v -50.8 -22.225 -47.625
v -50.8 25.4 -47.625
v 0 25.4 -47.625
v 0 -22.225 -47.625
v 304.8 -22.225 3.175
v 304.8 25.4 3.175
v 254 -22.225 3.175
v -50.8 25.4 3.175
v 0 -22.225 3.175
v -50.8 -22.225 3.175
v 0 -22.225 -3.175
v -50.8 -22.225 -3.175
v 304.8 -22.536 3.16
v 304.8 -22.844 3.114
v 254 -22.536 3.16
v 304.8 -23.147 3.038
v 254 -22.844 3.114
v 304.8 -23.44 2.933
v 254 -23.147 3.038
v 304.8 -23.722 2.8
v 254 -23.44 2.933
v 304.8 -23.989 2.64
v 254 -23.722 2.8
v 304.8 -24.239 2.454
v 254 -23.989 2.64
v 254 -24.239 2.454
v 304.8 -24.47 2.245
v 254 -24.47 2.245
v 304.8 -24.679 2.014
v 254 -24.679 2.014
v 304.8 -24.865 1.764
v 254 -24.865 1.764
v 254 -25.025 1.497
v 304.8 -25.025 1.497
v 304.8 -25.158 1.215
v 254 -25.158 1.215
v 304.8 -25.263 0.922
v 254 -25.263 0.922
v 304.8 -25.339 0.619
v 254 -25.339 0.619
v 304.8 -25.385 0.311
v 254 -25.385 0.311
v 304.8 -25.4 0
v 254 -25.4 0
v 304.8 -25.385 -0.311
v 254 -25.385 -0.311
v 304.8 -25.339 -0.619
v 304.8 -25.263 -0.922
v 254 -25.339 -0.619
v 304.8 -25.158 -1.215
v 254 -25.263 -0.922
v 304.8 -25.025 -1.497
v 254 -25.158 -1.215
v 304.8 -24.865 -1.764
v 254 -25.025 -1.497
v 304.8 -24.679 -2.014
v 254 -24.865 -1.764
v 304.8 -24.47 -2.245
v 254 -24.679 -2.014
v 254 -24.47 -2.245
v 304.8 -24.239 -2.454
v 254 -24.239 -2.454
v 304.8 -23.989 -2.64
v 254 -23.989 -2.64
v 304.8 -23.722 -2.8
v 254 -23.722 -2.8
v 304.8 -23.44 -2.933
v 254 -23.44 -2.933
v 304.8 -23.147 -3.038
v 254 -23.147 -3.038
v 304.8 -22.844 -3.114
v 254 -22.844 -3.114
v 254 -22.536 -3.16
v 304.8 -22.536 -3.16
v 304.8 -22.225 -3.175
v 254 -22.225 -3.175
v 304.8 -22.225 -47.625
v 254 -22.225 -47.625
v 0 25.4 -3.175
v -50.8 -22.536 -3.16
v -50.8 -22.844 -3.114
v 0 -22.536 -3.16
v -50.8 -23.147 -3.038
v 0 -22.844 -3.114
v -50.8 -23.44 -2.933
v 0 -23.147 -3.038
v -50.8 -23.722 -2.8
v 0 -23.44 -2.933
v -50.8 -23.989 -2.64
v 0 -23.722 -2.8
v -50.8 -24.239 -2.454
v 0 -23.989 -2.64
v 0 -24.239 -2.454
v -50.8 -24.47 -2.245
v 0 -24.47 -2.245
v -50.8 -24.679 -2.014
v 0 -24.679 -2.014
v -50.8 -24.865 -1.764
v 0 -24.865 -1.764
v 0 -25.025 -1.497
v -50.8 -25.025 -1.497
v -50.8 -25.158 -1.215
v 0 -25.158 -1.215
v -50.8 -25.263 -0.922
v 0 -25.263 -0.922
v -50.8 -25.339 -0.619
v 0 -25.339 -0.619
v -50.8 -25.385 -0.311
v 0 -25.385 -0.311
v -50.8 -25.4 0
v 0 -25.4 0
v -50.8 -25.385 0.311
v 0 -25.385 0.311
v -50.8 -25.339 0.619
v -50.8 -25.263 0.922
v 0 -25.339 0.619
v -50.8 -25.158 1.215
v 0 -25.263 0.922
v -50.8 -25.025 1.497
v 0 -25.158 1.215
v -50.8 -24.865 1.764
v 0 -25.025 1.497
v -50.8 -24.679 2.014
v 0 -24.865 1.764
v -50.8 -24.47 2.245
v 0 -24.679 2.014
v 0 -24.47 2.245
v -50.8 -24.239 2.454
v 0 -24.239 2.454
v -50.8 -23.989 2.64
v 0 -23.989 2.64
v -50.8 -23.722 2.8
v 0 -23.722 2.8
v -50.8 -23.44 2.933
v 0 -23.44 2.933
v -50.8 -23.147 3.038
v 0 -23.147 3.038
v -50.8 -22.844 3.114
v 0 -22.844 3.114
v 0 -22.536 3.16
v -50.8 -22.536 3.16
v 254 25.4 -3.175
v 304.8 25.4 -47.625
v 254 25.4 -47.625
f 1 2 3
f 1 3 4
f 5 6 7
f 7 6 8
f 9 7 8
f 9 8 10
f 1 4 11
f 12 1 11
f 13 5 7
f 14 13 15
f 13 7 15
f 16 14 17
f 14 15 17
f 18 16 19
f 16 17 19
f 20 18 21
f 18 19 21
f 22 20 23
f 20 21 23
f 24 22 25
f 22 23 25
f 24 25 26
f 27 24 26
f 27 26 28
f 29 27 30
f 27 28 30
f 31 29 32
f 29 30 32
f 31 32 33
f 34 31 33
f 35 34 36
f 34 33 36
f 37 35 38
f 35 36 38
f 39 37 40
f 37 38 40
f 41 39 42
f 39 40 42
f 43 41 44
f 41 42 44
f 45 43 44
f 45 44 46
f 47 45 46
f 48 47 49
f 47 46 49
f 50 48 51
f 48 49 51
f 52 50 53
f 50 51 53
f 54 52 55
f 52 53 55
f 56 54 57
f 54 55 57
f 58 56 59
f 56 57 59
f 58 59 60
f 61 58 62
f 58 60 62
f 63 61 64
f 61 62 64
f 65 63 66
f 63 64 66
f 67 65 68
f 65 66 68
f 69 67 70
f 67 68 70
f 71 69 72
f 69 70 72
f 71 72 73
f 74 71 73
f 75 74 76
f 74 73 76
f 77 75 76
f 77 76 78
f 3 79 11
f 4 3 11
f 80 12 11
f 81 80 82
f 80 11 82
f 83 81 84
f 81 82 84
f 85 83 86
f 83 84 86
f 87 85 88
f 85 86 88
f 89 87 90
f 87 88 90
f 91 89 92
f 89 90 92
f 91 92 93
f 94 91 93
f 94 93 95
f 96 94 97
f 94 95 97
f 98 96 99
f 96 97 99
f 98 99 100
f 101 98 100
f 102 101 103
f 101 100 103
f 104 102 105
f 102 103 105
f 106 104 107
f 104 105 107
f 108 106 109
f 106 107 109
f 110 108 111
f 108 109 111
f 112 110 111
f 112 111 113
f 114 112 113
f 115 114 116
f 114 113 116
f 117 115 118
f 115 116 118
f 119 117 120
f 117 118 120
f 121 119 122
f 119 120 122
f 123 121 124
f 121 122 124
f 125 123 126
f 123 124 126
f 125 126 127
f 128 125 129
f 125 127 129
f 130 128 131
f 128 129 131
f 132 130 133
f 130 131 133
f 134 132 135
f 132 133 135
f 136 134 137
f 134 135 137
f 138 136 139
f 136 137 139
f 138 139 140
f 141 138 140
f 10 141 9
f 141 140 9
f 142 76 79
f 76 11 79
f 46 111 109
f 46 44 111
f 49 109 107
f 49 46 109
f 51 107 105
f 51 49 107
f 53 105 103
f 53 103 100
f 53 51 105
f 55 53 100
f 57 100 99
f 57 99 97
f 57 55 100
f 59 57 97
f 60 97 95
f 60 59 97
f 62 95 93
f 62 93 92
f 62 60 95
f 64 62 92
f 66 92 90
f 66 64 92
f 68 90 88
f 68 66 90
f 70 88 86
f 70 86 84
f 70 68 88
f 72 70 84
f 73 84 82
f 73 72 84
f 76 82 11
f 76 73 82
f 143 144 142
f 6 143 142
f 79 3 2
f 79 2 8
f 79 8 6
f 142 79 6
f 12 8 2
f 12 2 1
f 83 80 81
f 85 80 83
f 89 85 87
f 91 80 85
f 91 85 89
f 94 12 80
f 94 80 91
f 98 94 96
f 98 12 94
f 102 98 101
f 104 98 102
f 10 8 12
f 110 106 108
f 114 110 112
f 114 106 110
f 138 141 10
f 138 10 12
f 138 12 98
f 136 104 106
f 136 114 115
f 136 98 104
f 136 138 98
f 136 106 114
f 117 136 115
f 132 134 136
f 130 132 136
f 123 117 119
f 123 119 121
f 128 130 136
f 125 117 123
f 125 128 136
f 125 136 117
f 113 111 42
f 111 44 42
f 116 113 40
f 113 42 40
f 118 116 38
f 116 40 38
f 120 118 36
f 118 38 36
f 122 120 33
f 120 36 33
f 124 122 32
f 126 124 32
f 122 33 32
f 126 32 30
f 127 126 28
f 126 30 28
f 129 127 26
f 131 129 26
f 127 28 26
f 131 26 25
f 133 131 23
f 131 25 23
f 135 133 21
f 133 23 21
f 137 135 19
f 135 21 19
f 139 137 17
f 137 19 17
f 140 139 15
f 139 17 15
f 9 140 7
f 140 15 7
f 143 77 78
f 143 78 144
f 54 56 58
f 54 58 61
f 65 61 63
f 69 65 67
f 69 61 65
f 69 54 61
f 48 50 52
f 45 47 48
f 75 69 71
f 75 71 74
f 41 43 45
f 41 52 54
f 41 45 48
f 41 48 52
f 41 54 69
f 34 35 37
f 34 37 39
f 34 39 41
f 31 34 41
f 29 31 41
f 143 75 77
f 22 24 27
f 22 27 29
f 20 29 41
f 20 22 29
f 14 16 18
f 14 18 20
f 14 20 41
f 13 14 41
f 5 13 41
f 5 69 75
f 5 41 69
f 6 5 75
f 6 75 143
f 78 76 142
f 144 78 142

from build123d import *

# Parameters (mm, degrees)
F0_W     = 50.8
F0_H     = 6.35
F1_DEPTH = 254
F2_R     = 3.17499
F3_W     = 47.625
F3_H     = 50.8
F4_DEPTH = 50.8
F6_DEPTH = 50.8
F8_DEPTH = 50.8


# Not quite as in the source:
# - a fillet or chamfer is up to 0.001 mm smaller than in the source, because OpenCascade refuses the exact size


with BuildPart() as f1:
    # F0 (on Right) → F1 (new body)
    with BuildSketch(Plane.YZ):
        Rectangle(F0_W, F0_H)
    extrude(amount=F1_DEPTH)

    # F2 (radius 3.175 in the source; OpenCascade refuses exactly that, so slightly less here)
    f2_edges = [f1.edges().sort_by_distance(p)[0] for p in [
        (127, -25.4, 3.175),
        (127, -25.4, -3.175),
    ]]
    fillet(f2_edges, radius=F2_R)

    # F3 (on face) → F4 (join)
    with BuildSketch(Plane(origin=(0, 0, 0), x_dir=(0, -1, 0), z_dir=(-1, 0, 0))):
        with Locations((-1.5875, -22.225)):
            Rectangle(F3_W, F3_H)
    extrude(amount=F4_DEPTH)

    # F5 (on face) → F6 (join, through all)
    with BuildSketch(Plane(origin=(0, 0, 0), x_dir=(0, -1, 0), z_dir=(-1, 0, 0))):
        with BuildLine():
            Line((22.225, 3.175), (22.225, -3.175))
            ThreePointArc((22.225, -3.175), (25.4, 0), (22.225, 3.175))
        make_face()
    extrude(amount=F6_DEPTH)

    # F7 (on face) → F8 (join)
    with BuildSketch(Plane.YZ.offset(254)):
        with BuildLine():
            Line((-22.225, -3.175), (-22.225, -47.625))
            Line((-22.225, -47.625), (25.4, -47.625))
            Line((25.4, -47.625), (25.4, 3.175))
            Line((25.4, 3.175), (-22.225, 3.175))
            ThreePointArc((-22.225, 3.175), (-25.4, 0), (-22.225, -3.175))
        make_face()
    extrude(amount=F8_DEPTH)


solid = f1.part
